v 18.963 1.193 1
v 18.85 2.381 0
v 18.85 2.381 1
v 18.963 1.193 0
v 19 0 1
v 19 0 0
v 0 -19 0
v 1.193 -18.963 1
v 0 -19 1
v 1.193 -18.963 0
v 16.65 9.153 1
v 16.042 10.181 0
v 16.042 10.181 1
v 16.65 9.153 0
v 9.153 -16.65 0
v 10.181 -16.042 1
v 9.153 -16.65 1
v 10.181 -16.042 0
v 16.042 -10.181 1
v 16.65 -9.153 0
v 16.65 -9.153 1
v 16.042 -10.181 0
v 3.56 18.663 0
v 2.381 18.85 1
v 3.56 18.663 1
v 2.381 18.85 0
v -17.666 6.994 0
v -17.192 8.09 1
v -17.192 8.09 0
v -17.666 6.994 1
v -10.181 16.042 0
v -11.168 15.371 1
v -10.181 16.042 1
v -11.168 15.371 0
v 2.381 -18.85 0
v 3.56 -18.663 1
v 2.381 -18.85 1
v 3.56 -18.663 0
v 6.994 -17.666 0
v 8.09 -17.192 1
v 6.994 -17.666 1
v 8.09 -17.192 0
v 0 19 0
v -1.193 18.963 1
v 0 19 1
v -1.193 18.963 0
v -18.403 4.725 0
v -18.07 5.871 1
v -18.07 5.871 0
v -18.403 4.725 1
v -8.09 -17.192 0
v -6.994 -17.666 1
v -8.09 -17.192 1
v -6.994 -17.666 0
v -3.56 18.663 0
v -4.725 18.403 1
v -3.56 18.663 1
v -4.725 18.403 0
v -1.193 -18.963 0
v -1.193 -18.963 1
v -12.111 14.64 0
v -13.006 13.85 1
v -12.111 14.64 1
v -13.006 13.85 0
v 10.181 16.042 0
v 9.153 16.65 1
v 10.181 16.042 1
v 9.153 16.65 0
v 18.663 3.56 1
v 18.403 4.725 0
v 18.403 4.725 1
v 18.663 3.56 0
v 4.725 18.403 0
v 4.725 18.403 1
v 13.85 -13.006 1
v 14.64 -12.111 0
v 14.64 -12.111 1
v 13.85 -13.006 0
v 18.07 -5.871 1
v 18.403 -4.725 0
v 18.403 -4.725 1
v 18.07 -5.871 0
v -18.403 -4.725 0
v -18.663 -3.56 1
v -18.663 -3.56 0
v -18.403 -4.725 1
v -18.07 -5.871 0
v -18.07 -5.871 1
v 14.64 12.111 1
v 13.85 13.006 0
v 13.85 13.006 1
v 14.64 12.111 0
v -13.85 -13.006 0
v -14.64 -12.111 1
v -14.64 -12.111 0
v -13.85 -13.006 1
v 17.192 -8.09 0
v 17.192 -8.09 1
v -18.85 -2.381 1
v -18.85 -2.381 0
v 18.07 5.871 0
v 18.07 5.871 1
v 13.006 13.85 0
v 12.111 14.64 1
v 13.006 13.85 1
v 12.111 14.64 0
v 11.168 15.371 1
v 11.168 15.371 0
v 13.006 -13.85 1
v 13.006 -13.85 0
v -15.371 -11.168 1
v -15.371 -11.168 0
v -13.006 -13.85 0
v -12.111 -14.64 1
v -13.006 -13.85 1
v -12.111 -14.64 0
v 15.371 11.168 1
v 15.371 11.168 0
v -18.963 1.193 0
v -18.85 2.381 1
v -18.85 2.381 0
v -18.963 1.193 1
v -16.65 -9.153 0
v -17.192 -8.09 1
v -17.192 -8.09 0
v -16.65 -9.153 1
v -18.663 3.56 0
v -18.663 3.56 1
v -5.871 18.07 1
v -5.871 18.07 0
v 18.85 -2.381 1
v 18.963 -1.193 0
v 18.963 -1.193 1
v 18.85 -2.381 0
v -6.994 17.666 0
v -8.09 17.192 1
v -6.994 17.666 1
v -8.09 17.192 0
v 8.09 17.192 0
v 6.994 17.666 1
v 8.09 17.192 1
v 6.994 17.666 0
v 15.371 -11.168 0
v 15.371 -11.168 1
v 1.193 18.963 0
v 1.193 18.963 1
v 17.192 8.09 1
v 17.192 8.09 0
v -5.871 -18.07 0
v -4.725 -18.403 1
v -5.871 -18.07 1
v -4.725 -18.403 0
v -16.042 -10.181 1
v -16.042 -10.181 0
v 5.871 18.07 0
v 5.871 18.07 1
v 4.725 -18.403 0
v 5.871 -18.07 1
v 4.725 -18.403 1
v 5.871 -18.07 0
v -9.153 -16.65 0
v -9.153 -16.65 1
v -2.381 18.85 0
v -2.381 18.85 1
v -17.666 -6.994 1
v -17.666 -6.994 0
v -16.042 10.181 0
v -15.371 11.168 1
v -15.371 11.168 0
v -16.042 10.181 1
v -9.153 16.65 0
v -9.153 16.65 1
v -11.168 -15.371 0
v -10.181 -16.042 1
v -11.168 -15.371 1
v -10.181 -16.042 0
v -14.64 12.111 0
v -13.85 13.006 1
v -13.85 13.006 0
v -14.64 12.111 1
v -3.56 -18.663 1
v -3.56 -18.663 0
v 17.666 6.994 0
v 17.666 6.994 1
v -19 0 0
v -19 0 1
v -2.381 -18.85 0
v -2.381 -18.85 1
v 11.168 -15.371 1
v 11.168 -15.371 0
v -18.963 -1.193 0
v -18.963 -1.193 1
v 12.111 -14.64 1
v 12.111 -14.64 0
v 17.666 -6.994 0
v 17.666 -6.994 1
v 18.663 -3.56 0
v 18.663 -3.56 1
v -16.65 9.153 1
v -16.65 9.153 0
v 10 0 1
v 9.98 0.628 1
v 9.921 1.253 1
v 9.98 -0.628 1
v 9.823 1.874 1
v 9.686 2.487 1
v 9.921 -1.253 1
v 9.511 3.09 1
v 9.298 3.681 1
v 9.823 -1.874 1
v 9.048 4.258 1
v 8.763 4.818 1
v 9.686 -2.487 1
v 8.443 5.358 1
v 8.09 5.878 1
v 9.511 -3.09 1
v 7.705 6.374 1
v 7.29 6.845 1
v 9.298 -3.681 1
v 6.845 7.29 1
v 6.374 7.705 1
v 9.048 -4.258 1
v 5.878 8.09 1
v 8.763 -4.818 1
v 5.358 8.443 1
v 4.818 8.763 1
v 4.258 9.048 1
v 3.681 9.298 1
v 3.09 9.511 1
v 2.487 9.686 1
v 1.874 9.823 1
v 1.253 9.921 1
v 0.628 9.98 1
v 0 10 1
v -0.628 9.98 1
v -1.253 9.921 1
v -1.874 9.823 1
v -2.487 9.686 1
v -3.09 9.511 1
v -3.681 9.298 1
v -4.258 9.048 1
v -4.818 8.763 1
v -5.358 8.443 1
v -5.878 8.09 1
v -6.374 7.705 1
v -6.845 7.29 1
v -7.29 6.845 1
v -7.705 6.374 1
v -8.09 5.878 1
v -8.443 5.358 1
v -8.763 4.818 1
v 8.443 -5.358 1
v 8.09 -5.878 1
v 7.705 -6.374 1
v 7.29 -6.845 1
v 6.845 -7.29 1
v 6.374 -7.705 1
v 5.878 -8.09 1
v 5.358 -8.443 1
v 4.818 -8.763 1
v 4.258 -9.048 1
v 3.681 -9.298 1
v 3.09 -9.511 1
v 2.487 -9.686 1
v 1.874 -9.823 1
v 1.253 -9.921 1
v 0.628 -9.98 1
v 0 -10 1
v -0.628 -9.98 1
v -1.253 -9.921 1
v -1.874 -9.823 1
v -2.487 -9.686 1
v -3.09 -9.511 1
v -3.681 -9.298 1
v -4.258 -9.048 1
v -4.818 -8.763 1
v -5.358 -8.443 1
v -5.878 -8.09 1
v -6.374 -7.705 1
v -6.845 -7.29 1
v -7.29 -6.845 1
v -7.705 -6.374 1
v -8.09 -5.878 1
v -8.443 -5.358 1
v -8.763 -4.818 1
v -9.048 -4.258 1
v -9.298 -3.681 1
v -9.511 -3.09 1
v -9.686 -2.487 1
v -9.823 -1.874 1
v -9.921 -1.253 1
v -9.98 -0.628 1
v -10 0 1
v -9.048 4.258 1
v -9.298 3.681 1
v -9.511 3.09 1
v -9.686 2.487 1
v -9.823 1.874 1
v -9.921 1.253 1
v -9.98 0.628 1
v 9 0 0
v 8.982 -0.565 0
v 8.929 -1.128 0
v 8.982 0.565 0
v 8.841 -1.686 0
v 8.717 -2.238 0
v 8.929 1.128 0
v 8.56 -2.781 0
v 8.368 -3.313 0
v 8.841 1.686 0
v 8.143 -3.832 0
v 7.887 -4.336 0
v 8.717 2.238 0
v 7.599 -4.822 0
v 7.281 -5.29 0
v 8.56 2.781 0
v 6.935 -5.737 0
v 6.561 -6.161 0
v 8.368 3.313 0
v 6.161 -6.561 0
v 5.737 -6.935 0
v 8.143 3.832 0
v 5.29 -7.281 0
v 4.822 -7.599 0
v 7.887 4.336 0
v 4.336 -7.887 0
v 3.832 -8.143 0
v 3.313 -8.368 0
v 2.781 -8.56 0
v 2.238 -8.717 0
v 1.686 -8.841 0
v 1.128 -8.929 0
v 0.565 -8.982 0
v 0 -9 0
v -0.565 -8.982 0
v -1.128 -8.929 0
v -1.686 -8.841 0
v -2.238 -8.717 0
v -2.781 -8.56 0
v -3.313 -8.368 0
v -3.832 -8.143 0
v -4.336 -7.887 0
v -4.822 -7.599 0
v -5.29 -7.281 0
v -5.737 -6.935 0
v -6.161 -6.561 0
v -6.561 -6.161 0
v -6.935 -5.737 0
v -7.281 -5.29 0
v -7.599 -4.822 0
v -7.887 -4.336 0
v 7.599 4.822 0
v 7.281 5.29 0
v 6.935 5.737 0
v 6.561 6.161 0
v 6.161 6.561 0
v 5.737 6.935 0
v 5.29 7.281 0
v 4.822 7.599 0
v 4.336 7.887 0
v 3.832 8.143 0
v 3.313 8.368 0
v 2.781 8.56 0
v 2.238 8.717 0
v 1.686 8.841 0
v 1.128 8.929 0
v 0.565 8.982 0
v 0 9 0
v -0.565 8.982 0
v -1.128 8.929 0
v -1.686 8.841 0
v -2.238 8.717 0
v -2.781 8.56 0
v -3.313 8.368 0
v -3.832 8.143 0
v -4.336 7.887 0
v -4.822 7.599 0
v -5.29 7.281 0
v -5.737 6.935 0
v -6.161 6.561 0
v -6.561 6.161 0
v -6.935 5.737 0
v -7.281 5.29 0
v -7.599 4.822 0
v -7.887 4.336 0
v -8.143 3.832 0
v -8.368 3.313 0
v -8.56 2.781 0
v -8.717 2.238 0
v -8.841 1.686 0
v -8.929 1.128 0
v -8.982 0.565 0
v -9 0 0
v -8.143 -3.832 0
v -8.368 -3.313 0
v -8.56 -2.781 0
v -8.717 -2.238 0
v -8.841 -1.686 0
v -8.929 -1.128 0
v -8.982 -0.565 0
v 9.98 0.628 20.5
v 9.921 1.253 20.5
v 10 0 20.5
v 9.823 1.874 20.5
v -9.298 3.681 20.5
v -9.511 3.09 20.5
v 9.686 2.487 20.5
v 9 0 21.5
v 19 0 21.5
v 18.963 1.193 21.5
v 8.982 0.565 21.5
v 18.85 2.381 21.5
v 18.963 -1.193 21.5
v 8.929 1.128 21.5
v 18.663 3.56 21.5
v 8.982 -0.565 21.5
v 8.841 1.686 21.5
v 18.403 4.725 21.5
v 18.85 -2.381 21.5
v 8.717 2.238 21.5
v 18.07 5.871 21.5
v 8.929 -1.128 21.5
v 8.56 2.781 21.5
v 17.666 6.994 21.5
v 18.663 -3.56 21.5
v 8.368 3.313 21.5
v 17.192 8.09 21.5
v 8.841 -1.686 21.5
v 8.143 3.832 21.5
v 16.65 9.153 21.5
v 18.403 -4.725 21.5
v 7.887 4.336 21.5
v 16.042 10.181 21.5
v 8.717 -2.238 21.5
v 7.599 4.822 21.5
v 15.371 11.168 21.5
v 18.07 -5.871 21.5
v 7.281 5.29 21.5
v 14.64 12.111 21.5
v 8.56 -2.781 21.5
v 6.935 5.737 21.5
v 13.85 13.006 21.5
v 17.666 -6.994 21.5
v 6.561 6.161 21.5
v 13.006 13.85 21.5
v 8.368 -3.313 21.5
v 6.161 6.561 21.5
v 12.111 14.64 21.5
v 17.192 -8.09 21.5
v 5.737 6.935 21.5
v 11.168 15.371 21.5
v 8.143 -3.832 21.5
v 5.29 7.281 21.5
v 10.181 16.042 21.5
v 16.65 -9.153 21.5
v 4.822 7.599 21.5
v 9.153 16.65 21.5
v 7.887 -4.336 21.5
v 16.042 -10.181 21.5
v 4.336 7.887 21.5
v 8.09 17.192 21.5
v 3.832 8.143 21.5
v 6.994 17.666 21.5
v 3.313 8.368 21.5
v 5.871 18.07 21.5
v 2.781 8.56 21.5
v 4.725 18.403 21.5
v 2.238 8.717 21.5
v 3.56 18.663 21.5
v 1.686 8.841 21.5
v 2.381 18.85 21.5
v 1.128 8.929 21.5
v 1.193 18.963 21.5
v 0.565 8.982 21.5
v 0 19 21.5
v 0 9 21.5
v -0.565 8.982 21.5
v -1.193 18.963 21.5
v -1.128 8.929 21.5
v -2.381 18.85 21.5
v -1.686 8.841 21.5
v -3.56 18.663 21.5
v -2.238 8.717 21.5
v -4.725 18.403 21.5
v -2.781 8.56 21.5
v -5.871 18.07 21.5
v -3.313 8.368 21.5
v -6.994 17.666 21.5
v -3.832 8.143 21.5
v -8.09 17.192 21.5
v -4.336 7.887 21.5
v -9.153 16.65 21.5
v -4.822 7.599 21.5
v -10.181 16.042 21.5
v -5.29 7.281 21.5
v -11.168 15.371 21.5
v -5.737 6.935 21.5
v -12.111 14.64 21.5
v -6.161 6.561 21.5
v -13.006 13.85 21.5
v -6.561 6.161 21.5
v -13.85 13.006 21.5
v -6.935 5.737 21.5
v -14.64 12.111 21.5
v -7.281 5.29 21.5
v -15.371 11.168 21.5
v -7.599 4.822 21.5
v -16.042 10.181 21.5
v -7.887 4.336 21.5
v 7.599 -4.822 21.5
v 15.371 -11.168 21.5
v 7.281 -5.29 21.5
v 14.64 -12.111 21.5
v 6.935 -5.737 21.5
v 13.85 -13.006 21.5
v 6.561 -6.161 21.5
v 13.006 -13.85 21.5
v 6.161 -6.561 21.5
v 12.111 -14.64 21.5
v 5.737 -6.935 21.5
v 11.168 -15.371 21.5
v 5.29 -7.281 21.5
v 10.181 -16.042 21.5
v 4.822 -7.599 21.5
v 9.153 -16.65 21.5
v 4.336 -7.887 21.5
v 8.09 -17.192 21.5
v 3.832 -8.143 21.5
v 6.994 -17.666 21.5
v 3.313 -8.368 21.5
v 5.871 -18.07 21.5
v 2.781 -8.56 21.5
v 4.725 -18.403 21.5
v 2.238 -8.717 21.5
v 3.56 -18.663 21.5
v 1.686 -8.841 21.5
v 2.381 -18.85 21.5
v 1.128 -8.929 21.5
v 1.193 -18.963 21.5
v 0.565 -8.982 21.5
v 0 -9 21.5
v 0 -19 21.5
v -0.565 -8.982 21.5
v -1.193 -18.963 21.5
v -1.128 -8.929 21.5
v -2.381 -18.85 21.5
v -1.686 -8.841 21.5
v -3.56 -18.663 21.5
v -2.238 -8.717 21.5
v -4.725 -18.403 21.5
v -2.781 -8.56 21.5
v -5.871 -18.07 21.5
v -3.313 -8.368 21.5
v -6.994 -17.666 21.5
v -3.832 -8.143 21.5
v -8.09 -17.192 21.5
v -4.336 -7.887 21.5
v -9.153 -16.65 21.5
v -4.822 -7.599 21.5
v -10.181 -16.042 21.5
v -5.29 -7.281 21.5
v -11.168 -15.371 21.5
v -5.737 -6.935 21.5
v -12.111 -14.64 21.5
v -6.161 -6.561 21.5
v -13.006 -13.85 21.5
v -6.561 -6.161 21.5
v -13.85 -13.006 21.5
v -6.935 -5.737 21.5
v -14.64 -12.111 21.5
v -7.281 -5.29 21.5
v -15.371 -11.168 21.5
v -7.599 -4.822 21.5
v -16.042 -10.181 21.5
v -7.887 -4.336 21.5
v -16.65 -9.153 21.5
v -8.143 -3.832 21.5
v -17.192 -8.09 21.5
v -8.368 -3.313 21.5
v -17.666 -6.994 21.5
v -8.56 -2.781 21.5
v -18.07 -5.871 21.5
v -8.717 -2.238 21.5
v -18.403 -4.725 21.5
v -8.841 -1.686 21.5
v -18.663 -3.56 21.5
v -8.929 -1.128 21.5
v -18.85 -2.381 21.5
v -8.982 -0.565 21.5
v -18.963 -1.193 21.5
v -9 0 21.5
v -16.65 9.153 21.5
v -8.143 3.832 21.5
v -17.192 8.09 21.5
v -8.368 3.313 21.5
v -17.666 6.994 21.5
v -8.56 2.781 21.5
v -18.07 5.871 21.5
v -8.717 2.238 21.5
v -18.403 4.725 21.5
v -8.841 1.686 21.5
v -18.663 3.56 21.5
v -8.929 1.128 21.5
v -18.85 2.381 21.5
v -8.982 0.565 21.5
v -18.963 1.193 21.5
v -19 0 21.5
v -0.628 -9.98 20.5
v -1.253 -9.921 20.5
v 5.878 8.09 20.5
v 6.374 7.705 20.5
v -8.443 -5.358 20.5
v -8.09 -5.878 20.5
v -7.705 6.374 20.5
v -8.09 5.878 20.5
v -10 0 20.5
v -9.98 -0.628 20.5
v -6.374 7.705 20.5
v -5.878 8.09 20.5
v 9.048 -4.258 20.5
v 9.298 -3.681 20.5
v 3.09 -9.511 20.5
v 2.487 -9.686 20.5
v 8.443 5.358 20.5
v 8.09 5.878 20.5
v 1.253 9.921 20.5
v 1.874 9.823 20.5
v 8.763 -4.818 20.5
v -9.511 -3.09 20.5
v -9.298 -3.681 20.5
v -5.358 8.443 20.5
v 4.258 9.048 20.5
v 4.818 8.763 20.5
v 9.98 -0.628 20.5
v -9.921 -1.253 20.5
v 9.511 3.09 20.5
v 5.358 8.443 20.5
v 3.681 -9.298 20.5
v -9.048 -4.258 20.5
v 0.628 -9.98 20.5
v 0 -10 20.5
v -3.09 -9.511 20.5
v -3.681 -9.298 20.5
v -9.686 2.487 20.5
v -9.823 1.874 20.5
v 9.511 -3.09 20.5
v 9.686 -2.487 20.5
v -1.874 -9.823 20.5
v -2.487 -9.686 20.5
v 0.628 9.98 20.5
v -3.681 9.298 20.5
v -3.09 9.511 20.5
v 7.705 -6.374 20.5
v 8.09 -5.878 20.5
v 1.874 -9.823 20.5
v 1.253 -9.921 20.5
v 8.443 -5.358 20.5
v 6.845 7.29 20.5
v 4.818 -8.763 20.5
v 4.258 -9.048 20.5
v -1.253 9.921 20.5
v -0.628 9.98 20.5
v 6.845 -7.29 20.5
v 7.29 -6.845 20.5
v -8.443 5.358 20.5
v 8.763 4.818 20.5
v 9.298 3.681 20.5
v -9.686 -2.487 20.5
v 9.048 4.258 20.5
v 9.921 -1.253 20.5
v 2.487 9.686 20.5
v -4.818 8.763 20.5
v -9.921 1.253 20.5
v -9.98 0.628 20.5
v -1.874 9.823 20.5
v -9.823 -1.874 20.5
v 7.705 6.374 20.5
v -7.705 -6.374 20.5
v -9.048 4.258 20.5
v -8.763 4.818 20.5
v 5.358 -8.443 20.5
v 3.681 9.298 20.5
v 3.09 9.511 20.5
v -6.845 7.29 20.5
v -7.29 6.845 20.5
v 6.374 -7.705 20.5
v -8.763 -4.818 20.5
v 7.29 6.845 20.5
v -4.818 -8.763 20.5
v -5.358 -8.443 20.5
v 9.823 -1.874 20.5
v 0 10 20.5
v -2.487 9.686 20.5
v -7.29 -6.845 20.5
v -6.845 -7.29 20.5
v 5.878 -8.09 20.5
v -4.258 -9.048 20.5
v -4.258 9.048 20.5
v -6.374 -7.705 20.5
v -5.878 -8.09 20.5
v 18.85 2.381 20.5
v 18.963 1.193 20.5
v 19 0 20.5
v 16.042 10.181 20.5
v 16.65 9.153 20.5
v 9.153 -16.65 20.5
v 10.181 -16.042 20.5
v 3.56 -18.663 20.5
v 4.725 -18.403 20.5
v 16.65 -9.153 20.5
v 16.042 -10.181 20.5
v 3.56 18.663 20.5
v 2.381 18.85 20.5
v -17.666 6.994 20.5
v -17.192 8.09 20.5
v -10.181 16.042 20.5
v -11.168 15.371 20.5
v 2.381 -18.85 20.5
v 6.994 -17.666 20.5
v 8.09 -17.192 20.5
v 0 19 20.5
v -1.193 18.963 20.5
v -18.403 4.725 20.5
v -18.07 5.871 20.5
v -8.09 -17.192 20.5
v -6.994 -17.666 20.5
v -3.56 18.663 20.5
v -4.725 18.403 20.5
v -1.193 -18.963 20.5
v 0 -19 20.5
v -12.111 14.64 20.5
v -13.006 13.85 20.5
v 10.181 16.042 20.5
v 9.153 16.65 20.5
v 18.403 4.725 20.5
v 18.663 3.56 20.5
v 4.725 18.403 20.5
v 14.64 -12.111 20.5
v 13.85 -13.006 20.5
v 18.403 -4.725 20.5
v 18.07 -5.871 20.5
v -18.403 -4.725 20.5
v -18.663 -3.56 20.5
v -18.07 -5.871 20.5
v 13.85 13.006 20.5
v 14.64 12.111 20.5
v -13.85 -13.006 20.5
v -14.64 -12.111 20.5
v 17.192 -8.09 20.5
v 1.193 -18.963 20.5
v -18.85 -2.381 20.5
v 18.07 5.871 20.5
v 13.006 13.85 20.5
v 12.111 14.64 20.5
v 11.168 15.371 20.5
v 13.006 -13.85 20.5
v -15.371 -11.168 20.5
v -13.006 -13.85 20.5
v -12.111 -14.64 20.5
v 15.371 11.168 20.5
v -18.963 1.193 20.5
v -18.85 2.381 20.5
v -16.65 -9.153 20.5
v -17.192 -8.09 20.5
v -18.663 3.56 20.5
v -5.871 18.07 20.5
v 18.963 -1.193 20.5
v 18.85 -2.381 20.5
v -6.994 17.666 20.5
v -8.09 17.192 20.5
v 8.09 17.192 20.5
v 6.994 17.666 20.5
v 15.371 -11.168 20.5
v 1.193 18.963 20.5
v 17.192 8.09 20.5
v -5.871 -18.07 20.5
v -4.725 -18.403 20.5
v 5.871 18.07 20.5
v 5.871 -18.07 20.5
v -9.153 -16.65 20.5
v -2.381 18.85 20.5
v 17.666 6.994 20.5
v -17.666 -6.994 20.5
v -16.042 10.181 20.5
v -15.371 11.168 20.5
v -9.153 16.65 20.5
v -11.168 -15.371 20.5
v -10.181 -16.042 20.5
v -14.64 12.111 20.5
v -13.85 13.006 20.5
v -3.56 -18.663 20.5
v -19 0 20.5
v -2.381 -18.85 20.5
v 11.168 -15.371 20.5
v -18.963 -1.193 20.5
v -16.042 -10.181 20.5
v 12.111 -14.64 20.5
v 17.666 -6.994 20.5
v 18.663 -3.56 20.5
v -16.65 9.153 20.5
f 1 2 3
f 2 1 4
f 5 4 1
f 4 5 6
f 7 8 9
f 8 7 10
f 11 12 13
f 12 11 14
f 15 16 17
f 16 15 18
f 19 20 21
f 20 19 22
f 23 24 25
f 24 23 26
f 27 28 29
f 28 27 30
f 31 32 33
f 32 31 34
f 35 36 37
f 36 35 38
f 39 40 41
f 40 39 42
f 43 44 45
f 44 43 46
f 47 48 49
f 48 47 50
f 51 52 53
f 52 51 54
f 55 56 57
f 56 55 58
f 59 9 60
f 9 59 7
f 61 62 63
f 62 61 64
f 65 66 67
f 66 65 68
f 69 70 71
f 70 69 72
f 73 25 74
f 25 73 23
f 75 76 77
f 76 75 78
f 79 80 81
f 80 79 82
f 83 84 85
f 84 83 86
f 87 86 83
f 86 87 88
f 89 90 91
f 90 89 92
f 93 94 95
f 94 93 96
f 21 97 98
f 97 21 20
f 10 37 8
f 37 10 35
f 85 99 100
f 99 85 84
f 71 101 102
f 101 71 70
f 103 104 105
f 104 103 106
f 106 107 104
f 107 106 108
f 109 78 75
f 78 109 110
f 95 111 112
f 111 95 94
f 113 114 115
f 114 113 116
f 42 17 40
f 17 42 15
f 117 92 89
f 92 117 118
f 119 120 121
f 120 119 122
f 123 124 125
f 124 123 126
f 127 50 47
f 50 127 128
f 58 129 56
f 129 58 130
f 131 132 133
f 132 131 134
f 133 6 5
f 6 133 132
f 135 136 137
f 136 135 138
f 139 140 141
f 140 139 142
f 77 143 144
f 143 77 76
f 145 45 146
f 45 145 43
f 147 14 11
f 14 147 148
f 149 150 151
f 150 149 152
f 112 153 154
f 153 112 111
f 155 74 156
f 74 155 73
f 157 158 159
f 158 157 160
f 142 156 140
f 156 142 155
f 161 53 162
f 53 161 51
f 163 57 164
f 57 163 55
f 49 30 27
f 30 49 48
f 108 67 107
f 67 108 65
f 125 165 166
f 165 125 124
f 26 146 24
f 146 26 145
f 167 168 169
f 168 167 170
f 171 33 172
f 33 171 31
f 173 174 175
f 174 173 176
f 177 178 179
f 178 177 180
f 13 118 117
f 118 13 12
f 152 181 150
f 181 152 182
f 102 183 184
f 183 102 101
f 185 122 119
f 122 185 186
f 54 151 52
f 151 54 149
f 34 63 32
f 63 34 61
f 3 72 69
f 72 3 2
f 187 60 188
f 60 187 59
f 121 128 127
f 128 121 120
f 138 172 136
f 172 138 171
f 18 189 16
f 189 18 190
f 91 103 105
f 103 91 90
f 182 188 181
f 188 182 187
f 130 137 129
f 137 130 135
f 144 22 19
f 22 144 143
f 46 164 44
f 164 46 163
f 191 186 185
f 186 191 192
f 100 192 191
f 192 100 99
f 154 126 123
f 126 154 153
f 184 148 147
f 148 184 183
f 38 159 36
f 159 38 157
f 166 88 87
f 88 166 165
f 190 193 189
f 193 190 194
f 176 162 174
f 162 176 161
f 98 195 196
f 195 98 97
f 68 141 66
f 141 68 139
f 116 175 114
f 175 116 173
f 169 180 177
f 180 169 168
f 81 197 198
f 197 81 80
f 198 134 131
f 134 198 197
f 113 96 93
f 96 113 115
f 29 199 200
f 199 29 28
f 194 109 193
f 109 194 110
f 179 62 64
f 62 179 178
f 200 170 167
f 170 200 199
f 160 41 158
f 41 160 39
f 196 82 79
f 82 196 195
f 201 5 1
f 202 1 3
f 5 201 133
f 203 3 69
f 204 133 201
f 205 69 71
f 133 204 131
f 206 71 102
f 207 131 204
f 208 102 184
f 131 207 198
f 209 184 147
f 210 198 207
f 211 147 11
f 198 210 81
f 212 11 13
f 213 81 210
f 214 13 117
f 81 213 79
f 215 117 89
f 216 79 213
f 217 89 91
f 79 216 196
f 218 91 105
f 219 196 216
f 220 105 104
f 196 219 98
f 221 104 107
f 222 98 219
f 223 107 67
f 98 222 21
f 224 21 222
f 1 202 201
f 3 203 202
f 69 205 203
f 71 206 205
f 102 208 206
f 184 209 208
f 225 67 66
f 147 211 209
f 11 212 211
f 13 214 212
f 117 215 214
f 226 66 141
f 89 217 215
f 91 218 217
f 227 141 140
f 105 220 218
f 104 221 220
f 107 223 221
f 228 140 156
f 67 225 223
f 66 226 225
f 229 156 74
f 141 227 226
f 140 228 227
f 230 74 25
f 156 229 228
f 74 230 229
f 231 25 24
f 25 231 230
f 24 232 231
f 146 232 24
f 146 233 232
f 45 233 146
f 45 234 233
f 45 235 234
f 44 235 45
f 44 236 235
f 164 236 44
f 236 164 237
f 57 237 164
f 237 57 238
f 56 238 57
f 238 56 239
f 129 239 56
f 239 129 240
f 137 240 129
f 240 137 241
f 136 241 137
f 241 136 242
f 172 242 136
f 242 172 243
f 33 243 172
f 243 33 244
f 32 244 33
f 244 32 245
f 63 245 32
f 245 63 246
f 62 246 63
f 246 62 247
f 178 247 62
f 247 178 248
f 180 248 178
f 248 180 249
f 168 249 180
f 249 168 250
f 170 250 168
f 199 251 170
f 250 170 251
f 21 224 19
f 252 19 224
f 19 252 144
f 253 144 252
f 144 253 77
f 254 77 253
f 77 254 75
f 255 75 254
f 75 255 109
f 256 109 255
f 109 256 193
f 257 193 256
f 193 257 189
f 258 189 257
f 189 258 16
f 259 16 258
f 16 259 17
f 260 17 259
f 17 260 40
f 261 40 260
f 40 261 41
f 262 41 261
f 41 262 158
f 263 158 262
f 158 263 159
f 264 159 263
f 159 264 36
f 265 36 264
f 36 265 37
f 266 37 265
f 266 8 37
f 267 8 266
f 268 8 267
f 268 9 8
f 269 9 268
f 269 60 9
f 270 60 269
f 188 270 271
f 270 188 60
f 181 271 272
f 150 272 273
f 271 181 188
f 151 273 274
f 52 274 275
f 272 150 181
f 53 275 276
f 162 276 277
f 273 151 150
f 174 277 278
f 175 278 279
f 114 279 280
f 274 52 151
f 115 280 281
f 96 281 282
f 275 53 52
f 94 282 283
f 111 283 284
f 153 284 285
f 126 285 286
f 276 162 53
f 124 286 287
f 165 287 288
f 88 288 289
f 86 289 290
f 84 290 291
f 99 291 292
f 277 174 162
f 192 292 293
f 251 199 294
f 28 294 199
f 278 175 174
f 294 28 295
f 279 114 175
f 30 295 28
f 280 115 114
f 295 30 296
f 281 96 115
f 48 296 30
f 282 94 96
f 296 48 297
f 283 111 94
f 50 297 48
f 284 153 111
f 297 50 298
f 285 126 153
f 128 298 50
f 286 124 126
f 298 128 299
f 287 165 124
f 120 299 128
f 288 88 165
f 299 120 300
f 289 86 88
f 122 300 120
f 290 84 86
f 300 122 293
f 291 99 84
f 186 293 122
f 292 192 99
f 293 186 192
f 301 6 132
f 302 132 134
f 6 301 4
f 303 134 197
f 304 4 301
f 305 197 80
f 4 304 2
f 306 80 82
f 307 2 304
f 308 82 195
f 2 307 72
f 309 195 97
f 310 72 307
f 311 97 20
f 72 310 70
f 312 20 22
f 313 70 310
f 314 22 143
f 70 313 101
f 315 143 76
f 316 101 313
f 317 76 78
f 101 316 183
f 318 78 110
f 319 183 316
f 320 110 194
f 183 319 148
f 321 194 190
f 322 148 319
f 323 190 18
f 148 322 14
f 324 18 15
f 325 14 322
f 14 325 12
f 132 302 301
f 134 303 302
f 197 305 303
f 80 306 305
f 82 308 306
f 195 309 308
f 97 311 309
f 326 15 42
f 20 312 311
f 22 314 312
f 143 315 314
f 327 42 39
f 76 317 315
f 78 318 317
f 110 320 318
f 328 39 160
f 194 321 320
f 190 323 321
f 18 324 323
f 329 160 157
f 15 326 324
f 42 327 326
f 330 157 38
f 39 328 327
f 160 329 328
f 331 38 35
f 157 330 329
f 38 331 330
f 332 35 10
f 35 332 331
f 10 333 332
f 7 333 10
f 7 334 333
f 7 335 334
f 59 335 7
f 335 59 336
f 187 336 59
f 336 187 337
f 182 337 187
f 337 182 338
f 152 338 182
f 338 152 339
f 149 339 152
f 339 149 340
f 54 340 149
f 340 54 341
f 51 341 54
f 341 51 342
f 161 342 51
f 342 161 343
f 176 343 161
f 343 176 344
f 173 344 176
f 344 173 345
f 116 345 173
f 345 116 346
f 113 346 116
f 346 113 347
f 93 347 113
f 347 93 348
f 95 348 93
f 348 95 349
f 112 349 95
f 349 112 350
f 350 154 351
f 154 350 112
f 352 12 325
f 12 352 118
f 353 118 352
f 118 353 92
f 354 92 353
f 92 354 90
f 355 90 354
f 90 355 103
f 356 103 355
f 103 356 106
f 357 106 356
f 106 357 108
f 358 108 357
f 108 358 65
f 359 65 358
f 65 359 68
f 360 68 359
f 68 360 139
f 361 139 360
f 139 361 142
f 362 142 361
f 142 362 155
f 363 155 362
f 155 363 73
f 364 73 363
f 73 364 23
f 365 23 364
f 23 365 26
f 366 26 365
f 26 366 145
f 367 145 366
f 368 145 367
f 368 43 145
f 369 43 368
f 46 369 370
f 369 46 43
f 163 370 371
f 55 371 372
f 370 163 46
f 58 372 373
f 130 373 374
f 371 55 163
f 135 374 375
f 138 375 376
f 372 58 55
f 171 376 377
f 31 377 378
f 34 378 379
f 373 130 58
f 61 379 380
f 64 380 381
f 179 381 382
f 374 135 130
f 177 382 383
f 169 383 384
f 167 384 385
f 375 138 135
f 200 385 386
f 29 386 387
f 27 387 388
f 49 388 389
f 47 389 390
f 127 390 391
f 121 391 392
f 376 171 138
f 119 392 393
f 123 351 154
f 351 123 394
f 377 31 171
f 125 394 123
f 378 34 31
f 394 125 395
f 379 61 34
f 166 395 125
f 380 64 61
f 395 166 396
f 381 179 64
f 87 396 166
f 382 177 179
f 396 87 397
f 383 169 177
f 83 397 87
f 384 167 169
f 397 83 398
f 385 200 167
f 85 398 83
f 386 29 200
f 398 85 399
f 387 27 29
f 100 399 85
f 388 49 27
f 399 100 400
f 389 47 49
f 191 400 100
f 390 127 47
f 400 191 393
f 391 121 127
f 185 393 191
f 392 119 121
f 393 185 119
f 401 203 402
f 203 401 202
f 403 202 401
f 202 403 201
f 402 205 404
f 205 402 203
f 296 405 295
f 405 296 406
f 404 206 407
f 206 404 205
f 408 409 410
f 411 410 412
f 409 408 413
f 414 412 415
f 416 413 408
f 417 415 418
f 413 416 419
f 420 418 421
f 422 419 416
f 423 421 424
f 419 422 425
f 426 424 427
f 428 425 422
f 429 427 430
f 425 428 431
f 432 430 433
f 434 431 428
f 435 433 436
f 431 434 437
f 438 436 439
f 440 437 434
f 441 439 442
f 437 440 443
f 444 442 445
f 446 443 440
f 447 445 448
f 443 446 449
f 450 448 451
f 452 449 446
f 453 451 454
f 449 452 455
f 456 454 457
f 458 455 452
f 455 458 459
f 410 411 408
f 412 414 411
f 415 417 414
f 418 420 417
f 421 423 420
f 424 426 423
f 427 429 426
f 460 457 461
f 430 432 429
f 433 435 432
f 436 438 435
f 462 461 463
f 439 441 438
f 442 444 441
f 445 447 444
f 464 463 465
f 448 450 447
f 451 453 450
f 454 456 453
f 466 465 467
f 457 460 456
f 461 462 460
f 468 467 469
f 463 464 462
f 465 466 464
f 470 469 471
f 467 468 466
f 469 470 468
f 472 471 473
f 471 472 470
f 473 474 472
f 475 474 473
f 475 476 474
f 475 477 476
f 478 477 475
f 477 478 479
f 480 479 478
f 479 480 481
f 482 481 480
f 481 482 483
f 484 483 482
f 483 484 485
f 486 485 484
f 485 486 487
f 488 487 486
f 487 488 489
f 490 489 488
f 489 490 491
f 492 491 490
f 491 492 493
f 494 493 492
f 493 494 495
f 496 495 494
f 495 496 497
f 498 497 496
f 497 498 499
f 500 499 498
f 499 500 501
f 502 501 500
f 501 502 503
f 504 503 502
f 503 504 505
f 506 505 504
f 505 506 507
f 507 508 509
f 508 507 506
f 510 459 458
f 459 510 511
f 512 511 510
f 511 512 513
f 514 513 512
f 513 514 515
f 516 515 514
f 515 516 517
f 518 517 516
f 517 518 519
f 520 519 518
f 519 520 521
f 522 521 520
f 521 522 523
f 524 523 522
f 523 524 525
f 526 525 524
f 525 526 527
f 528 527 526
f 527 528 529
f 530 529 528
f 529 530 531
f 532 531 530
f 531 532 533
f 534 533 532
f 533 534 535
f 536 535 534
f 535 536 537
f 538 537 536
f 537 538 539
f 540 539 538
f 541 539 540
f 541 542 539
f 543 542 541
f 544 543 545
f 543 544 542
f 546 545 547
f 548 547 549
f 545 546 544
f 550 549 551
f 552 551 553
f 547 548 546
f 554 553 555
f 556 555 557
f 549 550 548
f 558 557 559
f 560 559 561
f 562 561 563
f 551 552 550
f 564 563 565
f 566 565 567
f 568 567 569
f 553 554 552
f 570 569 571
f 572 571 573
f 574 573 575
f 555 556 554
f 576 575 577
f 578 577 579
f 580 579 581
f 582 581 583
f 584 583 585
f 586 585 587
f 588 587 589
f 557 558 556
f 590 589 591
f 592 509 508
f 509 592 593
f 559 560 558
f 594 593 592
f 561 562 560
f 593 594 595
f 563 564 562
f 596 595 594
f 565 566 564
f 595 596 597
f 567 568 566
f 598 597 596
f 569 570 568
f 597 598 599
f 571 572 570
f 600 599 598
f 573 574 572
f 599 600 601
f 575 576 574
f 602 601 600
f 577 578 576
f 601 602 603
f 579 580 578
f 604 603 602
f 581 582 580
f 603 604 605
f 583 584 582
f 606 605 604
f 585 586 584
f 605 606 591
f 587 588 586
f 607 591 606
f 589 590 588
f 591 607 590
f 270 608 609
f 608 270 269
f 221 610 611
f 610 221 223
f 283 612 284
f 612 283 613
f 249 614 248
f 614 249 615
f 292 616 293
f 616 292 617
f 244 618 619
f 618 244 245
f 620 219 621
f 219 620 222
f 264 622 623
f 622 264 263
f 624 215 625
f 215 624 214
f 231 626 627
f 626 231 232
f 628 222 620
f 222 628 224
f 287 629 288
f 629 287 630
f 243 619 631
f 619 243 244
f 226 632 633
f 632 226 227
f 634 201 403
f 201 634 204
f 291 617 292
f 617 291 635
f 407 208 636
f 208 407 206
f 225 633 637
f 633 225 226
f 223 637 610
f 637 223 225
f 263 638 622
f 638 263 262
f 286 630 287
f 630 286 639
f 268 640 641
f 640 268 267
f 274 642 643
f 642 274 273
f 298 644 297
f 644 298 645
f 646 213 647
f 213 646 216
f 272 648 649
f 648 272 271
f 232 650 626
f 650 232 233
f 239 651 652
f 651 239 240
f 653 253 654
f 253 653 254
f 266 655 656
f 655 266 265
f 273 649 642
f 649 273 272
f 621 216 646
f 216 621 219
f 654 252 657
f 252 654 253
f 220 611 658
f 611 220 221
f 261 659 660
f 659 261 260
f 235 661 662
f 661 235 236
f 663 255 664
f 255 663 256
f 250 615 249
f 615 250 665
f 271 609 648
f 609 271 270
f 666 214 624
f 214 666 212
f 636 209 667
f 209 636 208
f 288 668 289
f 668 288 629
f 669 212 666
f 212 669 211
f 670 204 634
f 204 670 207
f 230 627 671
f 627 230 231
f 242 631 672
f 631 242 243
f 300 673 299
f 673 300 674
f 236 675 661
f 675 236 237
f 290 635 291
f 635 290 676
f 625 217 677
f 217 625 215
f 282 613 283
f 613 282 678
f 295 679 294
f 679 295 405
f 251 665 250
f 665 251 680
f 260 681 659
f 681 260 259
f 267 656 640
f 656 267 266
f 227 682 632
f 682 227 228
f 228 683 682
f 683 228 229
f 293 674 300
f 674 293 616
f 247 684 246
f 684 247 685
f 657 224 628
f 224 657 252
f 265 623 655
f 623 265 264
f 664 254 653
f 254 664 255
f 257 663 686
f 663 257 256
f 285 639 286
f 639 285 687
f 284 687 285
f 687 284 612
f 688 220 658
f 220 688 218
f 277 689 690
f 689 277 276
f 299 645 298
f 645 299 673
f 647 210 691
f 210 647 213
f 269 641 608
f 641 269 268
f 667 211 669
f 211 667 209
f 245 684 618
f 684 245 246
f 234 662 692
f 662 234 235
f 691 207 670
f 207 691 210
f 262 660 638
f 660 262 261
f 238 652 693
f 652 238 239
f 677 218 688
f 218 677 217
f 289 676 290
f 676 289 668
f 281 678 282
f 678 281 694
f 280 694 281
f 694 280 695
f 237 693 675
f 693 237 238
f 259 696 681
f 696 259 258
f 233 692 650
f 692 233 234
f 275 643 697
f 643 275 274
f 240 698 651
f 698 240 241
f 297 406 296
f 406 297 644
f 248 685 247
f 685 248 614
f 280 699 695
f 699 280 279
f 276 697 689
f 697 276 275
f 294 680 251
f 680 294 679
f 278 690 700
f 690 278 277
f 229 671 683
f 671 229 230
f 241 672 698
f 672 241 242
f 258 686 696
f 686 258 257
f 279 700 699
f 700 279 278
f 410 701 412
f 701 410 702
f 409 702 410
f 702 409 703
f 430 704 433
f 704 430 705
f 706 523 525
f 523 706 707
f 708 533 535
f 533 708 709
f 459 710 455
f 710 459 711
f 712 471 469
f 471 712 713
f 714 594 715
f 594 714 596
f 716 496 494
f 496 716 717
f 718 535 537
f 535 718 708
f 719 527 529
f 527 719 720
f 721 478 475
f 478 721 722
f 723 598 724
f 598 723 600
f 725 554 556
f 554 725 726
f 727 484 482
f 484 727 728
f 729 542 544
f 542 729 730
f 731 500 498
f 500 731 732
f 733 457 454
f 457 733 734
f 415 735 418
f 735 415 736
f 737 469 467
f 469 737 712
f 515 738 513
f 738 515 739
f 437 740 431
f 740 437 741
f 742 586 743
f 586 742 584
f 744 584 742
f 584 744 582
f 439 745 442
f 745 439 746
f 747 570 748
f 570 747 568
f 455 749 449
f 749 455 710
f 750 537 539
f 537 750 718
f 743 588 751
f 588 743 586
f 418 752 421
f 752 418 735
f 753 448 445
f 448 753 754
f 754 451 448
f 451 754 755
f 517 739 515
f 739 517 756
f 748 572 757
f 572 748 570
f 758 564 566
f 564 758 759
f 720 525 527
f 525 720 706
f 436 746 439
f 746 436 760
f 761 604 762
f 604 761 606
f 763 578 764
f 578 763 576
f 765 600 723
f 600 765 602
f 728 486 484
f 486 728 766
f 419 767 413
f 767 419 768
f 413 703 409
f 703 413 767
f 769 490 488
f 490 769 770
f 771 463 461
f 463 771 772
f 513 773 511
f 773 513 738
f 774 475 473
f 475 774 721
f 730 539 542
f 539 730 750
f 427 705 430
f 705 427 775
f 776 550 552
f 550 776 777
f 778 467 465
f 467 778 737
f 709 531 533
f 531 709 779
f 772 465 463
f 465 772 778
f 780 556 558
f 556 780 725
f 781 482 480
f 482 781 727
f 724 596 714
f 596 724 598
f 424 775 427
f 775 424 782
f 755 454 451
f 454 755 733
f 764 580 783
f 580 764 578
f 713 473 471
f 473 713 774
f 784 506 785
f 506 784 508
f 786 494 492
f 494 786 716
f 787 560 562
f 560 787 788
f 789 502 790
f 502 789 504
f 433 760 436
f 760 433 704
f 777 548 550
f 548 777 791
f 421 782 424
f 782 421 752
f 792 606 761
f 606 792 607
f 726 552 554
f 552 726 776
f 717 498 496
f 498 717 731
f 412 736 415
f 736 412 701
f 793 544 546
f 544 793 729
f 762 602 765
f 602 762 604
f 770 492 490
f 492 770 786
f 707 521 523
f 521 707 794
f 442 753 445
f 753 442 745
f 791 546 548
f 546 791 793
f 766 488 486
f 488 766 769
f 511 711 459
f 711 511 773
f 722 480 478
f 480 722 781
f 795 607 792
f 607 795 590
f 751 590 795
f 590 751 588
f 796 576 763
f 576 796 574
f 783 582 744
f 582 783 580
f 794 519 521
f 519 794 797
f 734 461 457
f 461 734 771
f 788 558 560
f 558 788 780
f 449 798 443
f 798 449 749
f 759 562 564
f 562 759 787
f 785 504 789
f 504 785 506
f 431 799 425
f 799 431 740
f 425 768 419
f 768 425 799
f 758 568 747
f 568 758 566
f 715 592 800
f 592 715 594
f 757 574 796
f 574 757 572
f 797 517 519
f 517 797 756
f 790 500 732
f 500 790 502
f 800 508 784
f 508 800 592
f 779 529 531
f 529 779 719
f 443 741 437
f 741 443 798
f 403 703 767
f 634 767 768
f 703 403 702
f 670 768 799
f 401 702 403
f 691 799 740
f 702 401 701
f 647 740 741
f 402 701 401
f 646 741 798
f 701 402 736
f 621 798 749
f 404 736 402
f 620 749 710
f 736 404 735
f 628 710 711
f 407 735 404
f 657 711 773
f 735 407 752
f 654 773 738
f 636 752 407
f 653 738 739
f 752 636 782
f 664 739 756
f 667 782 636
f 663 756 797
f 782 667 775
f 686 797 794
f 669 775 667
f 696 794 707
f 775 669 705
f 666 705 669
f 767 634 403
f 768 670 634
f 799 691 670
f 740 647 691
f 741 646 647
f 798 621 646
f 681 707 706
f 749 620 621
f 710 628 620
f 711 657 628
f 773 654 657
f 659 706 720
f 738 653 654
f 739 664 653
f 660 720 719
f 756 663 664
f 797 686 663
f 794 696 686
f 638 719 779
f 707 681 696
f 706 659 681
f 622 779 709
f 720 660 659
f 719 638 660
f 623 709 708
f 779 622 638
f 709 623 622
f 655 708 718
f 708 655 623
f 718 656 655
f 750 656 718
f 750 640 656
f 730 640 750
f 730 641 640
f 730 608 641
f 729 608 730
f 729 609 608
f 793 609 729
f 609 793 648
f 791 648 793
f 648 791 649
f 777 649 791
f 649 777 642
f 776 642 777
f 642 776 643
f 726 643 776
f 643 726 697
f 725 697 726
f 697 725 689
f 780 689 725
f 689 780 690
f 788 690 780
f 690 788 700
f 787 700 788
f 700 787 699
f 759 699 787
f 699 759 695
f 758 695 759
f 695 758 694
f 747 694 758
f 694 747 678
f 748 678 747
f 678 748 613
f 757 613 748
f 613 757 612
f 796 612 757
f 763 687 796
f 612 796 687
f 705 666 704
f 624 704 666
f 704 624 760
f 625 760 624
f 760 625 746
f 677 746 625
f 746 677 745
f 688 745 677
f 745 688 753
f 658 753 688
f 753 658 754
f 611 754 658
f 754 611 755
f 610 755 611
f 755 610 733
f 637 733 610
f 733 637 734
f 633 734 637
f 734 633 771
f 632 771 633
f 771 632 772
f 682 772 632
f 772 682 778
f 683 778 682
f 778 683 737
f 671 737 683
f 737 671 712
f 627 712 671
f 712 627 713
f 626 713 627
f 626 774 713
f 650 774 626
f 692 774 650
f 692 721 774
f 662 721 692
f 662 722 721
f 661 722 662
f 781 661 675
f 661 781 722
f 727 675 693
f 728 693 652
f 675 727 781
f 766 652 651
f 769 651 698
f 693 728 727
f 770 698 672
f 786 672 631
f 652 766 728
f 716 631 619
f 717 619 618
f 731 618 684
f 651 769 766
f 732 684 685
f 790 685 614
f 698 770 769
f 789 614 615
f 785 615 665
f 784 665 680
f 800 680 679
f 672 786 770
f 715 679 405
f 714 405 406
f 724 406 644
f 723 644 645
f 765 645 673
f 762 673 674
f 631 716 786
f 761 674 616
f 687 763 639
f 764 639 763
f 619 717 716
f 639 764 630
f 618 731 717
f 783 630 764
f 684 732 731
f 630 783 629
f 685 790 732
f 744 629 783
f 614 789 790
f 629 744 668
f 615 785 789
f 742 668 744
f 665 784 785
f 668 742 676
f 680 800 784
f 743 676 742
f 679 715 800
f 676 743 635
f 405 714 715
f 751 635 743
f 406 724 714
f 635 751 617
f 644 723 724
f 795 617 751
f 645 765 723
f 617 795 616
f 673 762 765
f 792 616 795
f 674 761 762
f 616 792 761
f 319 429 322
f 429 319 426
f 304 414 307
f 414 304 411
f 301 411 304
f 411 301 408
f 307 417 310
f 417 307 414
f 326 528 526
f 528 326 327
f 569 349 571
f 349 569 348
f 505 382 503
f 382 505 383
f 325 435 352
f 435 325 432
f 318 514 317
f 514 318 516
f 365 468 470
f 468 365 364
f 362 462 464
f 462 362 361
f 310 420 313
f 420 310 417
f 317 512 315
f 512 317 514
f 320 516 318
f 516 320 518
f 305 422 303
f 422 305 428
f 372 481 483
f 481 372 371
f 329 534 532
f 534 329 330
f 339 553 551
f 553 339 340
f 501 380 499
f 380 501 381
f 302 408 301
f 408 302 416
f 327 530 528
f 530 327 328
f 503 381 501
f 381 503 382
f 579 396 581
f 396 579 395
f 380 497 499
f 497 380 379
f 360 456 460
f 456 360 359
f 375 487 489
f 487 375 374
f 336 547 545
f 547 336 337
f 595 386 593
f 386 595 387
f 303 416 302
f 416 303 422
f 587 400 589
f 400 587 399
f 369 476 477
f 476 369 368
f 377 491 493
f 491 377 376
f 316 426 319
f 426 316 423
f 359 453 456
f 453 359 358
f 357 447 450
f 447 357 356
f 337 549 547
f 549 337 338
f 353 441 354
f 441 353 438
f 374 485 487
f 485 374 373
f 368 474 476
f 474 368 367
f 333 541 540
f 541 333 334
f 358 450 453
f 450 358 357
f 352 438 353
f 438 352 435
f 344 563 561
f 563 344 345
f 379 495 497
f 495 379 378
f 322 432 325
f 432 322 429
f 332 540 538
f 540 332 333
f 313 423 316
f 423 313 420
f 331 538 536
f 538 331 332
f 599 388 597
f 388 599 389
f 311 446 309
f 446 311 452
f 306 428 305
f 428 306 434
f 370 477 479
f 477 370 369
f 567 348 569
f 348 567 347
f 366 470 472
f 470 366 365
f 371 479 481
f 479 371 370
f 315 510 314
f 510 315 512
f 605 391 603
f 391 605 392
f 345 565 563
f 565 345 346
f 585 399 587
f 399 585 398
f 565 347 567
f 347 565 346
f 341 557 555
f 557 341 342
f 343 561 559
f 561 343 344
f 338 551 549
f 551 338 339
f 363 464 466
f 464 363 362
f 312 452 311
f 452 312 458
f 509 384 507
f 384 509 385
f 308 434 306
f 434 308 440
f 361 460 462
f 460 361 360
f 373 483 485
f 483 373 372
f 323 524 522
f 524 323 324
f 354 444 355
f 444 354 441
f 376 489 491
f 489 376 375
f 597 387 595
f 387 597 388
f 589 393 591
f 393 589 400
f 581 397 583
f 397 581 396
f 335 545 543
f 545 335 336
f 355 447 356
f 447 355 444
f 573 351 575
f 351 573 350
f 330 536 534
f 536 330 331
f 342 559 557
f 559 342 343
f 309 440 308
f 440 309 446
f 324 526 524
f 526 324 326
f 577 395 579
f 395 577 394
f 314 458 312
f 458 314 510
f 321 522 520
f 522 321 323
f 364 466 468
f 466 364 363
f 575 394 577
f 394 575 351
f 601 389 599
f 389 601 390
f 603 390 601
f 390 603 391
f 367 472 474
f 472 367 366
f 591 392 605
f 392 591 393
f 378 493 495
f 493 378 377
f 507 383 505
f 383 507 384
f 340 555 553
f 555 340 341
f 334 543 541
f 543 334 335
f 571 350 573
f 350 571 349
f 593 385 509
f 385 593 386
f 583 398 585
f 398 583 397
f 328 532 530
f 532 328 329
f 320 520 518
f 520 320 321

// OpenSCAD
$fn=100;

difference() {
union(0)
{
cylinder(h=1,r=19);
translate([0,0,0.5]) cylinder (h=21,r=10);   
translate([0,0,20.5])cylinder(h=1,r=19);;    

}
 cylinder(h=25,r=9);
}

 
